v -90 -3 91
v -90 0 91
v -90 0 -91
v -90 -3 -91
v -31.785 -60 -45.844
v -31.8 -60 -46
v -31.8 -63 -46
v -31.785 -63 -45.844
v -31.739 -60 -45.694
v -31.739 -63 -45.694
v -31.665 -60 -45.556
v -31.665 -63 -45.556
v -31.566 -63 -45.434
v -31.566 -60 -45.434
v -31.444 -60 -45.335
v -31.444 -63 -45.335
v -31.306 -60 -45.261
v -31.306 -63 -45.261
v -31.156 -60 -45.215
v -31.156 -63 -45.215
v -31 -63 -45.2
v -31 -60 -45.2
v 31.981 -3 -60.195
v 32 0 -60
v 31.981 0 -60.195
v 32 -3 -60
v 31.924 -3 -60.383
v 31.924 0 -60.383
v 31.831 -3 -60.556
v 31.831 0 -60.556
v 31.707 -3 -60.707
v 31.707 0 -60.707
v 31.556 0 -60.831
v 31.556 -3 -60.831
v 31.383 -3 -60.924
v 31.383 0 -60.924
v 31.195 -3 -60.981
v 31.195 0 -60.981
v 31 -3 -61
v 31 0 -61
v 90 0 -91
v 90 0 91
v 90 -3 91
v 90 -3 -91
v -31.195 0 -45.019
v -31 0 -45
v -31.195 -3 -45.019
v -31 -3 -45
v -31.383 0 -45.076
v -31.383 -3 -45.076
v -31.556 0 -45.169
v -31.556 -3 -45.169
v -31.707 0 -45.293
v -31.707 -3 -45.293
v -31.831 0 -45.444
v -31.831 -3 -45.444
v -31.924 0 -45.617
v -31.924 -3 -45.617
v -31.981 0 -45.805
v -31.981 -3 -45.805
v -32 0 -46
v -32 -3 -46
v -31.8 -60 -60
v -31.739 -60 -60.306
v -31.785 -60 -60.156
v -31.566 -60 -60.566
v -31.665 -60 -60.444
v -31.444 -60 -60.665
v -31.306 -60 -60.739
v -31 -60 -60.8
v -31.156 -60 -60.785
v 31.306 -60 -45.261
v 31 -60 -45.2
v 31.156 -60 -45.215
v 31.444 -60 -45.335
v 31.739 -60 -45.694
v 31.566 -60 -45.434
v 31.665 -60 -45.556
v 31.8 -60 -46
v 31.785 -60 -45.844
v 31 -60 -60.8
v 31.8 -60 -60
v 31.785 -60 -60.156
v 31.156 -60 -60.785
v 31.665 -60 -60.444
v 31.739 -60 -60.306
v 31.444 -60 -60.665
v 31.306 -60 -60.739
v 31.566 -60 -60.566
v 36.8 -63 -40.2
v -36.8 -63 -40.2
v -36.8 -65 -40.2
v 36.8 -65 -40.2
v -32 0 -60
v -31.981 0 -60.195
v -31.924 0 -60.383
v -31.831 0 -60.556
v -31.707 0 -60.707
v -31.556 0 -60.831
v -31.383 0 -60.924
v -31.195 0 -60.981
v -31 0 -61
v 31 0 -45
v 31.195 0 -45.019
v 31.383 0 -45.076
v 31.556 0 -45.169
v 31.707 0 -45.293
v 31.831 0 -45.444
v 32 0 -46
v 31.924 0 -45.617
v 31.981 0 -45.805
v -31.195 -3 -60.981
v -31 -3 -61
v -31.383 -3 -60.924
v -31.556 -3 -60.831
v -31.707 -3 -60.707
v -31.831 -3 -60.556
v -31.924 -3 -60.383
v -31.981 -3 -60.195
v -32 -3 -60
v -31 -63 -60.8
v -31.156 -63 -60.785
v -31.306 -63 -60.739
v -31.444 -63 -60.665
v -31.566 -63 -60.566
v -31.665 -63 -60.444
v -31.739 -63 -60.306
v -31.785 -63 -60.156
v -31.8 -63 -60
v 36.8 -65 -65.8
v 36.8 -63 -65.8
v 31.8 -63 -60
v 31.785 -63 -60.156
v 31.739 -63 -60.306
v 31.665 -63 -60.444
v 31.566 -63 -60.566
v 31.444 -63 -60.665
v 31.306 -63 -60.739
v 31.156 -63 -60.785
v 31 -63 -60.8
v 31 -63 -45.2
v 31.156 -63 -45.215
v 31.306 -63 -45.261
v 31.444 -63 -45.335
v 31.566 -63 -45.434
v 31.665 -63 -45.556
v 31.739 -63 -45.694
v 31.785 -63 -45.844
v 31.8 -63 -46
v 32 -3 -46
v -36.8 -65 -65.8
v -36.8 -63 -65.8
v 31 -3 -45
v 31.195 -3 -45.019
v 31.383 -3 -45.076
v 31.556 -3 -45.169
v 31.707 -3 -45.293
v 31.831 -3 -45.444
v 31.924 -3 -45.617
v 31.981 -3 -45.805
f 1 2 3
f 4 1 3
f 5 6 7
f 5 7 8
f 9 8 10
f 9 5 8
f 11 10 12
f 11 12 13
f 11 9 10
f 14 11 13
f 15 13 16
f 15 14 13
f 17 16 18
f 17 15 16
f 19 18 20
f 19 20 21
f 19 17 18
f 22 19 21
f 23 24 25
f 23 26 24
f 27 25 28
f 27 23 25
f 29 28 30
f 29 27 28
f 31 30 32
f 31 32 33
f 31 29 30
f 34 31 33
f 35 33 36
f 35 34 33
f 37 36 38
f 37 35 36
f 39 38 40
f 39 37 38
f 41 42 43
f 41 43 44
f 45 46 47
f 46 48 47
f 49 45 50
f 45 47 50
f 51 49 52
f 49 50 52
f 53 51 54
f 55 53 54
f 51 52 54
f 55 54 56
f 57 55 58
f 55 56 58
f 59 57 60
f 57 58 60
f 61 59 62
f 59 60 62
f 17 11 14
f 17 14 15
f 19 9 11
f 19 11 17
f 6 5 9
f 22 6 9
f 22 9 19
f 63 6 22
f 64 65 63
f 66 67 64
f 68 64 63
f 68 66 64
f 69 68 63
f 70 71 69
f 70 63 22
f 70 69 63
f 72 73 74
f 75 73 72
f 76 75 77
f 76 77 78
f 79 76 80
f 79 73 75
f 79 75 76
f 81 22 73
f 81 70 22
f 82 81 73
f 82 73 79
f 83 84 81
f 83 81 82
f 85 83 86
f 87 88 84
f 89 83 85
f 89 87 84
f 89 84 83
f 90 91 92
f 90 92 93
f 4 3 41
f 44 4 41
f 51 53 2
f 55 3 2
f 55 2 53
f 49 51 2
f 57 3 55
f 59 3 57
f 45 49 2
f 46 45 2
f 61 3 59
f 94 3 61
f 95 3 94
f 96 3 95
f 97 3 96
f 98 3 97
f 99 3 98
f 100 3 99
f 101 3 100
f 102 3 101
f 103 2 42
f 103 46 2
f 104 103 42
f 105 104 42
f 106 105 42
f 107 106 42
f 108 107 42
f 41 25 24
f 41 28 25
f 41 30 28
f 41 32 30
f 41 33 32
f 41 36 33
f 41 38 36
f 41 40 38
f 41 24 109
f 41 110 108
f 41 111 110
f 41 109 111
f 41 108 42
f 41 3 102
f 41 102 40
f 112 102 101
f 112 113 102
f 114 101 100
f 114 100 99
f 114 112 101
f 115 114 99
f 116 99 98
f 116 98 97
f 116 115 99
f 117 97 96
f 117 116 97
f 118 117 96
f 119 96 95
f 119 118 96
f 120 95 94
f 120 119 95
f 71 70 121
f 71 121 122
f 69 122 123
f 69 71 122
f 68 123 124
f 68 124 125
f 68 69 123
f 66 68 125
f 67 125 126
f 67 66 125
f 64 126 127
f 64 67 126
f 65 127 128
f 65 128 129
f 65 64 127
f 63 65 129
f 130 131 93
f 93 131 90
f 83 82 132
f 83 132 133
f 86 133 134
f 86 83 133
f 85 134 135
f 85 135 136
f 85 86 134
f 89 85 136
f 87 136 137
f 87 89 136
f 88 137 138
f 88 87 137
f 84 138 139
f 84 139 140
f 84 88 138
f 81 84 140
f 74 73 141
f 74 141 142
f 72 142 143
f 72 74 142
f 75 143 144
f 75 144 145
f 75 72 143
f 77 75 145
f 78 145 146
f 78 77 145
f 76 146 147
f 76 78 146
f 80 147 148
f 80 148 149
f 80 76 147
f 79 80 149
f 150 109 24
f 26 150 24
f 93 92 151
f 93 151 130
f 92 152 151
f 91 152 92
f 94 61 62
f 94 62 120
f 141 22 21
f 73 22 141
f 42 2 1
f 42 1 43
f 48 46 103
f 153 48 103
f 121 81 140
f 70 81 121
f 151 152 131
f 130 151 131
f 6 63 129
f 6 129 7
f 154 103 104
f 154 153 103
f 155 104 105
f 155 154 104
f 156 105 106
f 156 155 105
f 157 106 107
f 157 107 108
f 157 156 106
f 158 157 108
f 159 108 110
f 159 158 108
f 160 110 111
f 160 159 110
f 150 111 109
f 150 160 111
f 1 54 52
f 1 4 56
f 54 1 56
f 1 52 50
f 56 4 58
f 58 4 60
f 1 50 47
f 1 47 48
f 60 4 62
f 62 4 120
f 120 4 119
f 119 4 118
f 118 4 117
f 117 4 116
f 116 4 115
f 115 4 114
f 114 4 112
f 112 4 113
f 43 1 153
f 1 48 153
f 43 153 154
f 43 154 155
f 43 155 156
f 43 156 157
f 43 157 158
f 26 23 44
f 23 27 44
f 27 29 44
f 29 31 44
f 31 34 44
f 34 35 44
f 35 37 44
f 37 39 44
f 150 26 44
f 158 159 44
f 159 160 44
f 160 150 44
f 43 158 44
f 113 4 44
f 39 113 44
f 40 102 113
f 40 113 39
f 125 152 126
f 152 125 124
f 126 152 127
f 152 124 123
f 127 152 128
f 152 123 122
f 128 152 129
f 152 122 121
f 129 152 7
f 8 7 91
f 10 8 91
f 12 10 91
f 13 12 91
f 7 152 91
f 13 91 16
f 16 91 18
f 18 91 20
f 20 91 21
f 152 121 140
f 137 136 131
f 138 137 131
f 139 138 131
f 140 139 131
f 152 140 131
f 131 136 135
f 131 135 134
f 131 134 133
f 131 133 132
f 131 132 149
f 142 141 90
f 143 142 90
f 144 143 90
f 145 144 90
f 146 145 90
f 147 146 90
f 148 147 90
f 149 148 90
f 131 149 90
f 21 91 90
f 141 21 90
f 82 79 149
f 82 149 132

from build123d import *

# Parameters (mm, degrees)
CROQUIS2_W     = 180
CROQUIS2_H     = 182
EXTRUIR1_DEPTH = 3
CROQUIS4_W     = 64
CROQUIS4_H     = 16
EXTRUIR2_DEPTH = 10
REDONDEO1_R    = 1
EXTRUIR3_DEPTH = 3
CROQUIS7_W     = 73.6
CROQUIS7_H     = 25.6
EXTRUIR4_DEPTH = 2


with BuildPart() as part:
    # Croquis2 → Extruir1 (new body)
    with BuildSketch(Plane(origin=(0, 0, 0), x_dir=(1, 0, 0), z_dir=(0, 1, 0))):
        Rectangle(CROQUIS2_W, CROQUIS2_H)
    extrude(amount=-EXTRUIR1_DEPTH)

    # Croquis4 → Extruir2 (cut)
    with BuildSketch(Plane(origin=(0, 0, 0), x_dir=(1, 0, 0), z_dir=(0, 1, 0))):
        with Locations((0, 53)):
            Rectangle(CROQUIS4_W, CROQUIS4_H)
    extrude(amount=-EXTRUIR2_DEPTH, mode=Mode.SUBTRACT)

    # Redondeo1
    redondeo1_edges = [part.edges().sort_by_distance(p)[0] for p in [
        (-32, -1.5, -45),
        (-32, -1.5, -61),
        (32, -1.5, -61),
        (32, -1.5, -45),
    ]]
    fillet(redondeo1_edges, radius=REDONDEO1_R)


with BuildPart() as body_2:
    # Croquis5 → Extruir3 (new body)
    with BuildSketch(Plane(origin=(0, 0, 0), x_dir=(1, 0, 0), z_dir=(0, 1, 0))):
        with BuildLine():
            Line((31.8, 46), (31.8, 60))
            ThreePointArc((31.8, 60), (31.565685425, 60.565685425), (31, 60.8))
            Line((31, 60.8), (-31, 60.8))
            ThreePointArc((-31, 60.8), (-31.565685425, 60.565685425), (-31.8, 60))
            Line((-31.8, 60), (-31.8, 46))
            ThreePointArc((-31.8, 46), (-31.565685425, 45.434314575), (-31, 45.2))
            Line((-31, 45.2), (31, 45.2))
            ThreePointArc((31, 45.2), (31.565685425, 45.434314575), (31.8, 46))
        make_face()
    extrude(amount=-EXTRUIR3_DEPTH)

    # Croquis7 → Extruir4 (add)
    with BuildSketch(Plane.XZ.offset(3)):
        with Locations((0, -53)):
            Rectangle(CROQUIS7_W, CROQUIS7_H)
    extrude(amount=EXTRUIR4_DEPTH)


with BuildPart() as body_2_1:
    # Sólido-Mover/Copiar1: moved
    add(body_2.part.moved(Location((0, -60, 0))))


solid = Compound([part.part, body_2_1.part])
